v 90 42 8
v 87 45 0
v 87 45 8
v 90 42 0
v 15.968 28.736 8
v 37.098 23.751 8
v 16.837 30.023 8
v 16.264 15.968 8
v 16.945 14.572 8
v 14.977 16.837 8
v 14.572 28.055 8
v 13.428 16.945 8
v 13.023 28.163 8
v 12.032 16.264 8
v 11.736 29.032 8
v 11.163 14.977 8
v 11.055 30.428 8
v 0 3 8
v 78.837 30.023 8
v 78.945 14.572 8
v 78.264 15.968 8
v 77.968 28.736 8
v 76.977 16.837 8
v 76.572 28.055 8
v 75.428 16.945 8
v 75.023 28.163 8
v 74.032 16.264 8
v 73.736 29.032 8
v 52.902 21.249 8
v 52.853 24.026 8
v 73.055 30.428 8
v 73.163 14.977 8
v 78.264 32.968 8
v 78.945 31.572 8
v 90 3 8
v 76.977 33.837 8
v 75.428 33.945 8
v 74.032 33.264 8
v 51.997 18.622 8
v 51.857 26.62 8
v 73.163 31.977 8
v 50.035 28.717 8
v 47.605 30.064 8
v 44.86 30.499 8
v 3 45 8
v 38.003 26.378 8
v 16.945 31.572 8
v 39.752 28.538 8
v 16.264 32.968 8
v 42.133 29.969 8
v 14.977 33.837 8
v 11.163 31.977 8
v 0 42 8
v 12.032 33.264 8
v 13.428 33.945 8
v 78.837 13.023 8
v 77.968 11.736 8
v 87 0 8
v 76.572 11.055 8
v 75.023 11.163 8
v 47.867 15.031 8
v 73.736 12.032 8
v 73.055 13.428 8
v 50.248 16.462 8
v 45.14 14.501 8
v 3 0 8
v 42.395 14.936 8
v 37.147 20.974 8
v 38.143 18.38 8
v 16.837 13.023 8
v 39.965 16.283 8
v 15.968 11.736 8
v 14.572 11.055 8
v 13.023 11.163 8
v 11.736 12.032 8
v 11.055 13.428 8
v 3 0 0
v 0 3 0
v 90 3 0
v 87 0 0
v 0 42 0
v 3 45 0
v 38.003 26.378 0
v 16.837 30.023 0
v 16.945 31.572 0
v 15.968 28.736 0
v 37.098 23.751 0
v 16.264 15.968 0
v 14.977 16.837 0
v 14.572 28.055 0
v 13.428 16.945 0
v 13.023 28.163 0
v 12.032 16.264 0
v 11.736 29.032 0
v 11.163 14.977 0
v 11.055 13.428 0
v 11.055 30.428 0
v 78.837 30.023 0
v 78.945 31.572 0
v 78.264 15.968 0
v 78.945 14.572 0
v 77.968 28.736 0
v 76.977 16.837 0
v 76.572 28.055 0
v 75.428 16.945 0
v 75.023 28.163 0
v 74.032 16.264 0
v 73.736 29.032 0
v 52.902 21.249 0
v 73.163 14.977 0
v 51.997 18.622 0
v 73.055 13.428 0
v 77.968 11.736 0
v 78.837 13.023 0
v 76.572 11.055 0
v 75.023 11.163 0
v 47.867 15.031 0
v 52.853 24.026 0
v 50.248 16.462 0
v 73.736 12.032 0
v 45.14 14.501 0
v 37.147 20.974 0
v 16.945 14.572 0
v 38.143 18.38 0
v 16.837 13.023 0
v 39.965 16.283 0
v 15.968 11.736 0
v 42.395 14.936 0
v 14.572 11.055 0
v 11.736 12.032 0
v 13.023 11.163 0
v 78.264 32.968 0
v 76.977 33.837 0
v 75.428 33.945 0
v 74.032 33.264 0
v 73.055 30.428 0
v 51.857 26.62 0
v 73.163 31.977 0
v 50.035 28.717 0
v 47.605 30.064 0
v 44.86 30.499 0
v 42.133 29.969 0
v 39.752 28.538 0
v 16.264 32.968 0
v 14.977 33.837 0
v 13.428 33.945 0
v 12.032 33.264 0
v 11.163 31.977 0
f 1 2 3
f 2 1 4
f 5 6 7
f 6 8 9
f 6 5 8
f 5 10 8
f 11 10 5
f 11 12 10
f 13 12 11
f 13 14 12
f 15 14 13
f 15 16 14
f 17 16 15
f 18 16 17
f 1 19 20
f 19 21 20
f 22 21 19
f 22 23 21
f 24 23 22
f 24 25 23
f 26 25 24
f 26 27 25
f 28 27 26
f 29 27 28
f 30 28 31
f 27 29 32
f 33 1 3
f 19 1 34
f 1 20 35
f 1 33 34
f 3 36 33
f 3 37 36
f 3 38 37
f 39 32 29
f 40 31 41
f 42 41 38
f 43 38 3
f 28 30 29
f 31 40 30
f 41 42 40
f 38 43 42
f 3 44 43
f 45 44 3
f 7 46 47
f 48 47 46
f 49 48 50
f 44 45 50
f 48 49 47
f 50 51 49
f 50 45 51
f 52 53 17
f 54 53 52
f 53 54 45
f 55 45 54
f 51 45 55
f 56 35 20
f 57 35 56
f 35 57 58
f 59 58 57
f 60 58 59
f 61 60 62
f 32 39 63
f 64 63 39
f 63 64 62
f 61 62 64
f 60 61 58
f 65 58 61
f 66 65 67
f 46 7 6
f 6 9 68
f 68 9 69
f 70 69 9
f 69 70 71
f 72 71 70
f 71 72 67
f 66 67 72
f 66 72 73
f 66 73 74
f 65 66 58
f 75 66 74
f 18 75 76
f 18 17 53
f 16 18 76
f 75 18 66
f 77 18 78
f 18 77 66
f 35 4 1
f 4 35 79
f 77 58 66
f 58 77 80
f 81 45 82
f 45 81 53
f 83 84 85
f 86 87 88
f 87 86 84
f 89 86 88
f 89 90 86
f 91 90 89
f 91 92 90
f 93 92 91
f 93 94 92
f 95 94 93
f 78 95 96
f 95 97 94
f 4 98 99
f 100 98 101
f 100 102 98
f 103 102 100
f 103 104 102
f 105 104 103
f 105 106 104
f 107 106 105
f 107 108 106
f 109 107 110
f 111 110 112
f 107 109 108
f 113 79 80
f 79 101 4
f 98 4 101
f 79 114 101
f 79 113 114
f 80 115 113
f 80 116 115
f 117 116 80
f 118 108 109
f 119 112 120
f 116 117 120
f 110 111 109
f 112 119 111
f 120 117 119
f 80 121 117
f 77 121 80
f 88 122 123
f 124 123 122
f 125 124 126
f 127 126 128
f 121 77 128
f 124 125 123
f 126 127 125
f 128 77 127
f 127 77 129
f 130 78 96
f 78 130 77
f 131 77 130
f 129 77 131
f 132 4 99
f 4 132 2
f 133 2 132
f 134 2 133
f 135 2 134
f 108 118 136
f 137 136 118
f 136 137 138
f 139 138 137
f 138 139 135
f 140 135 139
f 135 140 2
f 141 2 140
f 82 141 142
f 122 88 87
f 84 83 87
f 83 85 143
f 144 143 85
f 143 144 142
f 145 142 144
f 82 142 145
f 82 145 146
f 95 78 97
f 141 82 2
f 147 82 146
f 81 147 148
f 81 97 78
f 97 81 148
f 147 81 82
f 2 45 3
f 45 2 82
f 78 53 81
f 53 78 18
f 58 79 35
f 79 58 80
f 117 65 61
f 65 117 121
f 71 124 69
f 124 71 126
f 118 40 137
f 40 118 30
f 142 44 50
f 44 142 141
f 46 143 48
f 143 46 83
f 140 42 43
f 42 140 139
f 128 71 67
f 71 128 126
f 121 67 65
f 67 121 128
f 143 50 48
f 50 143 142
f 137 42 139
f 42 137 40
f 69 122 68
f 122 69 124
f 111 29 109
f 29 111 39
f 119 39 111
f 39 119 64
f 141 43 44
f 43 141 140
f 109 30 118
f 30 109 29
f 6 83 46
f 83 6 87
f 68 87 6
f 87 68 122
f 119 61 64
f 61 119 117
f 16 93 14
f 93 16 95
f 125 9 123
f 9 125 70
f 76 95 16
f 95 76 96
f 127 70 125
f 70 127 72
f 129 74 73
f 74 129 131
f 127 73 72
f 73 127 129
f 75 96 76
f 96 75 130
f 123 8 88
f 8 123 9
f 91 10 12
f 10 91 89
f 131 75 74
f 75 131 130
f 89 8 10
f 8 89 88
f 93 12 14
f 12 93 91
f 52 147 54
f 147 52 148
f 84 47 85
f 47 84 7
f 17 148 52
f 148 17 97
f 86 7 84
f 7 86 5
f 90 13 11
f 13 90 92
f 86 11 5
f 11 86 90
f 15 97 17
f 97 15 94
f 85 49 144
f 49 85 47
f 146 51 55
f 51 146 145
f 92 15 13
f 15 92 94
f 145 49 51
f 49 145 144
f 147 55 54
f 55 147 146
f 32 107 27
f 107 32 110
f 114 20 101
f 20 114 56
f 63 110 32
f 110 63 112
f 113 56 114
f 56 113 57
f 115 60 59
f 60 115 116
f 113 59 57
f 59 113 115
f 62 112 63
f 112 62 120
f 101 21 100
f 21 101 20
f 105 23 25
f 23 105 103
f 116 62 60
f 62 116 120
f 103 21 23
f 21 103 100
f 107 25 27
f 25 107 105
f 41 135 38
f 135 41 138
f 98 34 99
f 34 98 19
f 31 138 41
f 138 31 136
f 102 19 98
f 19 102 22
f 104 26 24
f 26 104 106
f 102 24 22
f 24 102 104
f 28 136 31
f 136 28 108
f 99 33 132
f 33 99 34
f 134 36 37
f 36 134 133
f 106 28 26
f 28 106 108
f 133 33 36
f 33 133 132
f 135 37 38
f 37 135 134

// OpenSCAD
$fn = 32;

// ----------------------------------------------------------------------
// Spacer plate: rect 90 x 45
// ----------------------------------------------------------------------

// --- parameters (mm) ---
bore_r = 8;               // centre bore radius
bolt_r = 3;               // bolt hole radius
plate_t = 8;              // plate thickness, Z (extrusion height)
plate_l = 90;             // plate length, X
plate_w = 45;             // plate width, Y
inset = 14;               // corner hole inset

profile = [[3, 0], [87, 0], [90, 3], [90, 42], [87, 45], [3, 45], [0, 42], [0, 3]];  // primary outline, 8 points, counter clockwise
void_1 = [[52.853, 24.026], [51.857, 26.62], [50.035, 28.717], [47.605, 30.064], [44.86, 30.499], [42.133, 29.969], [39.752, 28.538], [38.003, 26.378], [37.098, 23.751], [37.147, 20.974], [38.143, 18.38], [39.965, 16.283], [42.395, 14.936], [45.14, 14.501], [47.867, 15.031], [50.248, 16.462], [51.997, 18.622], [52.902, 21.249]];  // centre bore, 18 points
void_2 = [[16.945, 14.572], [16.264, 15.968], [14.977, 16.837], [13.428, 16.945], [12.032, 16.264], [11.163, 14.977], [11.055, 13.428], [11.736, 12.032], [13.023, 11.163], [14.572, 11.055], [15.968, 11.736], [16.837, 13.023]];  // corner hole, 12 points
void_3 = [[16.945, 31.572], [16.264, 32.968], [14.977, 33.837], [13.428, 33.945], [12.032, 33.264], [11.163, 31.977], [11.055, 30.428], [11.736, 29.032], [13.023, 28.163], [14.572, 28.055], [15.968, 28.736], [16.837, 30.023]];  // corner hole, 12 points
void_4 = [[78.945, 14.572], [78.264, 15.968], [76.977, 16.837], [75.428, 16.945], [74.032, 16.264], [73.163, 14.977], [73.055, 13.428], [73.736, 12.032], [75.023, 11.163], [76.572, 11.055], [77.968, 11.736], [78.837, 13.023]];  // corner hole, 12 points
void_5 = [[78.945, 31.572], [78.264, 32.968], [76.977, 33.837], [75.428, 33.945], [74.032, 33.264], [73.163, 31.977], [73.055, 30.428], [73.736, 29.032], [75.023, 28.163], [76.572, 28.055], [77.968, 28.736], [78.837, 30.023]];  // corner hole, 12 points

// --- the one profile operation ---
difference() {
  linear_extrude(height = plate_t) polygon(points = profile);
  translate([0, 0, -1])
    linear_extrude(height = plate_t + 2) polygon(points = void_1);
  translate([0, 0, -1])
    linear_extrude(height = plate_t + 2) polygon(points = void_2);
  translate([0, 0, -1])
    linear_extrude(height = plate_t + 2) polygon(points = void_3);
  translate([0, 0, -1])
    linear_extrude(height = plate_t + 2) polygon(points = void_4);
  translate([0, 0, -1])
    linear_extrude(height = plate_t + 2) polygon(points = void_5);
}
